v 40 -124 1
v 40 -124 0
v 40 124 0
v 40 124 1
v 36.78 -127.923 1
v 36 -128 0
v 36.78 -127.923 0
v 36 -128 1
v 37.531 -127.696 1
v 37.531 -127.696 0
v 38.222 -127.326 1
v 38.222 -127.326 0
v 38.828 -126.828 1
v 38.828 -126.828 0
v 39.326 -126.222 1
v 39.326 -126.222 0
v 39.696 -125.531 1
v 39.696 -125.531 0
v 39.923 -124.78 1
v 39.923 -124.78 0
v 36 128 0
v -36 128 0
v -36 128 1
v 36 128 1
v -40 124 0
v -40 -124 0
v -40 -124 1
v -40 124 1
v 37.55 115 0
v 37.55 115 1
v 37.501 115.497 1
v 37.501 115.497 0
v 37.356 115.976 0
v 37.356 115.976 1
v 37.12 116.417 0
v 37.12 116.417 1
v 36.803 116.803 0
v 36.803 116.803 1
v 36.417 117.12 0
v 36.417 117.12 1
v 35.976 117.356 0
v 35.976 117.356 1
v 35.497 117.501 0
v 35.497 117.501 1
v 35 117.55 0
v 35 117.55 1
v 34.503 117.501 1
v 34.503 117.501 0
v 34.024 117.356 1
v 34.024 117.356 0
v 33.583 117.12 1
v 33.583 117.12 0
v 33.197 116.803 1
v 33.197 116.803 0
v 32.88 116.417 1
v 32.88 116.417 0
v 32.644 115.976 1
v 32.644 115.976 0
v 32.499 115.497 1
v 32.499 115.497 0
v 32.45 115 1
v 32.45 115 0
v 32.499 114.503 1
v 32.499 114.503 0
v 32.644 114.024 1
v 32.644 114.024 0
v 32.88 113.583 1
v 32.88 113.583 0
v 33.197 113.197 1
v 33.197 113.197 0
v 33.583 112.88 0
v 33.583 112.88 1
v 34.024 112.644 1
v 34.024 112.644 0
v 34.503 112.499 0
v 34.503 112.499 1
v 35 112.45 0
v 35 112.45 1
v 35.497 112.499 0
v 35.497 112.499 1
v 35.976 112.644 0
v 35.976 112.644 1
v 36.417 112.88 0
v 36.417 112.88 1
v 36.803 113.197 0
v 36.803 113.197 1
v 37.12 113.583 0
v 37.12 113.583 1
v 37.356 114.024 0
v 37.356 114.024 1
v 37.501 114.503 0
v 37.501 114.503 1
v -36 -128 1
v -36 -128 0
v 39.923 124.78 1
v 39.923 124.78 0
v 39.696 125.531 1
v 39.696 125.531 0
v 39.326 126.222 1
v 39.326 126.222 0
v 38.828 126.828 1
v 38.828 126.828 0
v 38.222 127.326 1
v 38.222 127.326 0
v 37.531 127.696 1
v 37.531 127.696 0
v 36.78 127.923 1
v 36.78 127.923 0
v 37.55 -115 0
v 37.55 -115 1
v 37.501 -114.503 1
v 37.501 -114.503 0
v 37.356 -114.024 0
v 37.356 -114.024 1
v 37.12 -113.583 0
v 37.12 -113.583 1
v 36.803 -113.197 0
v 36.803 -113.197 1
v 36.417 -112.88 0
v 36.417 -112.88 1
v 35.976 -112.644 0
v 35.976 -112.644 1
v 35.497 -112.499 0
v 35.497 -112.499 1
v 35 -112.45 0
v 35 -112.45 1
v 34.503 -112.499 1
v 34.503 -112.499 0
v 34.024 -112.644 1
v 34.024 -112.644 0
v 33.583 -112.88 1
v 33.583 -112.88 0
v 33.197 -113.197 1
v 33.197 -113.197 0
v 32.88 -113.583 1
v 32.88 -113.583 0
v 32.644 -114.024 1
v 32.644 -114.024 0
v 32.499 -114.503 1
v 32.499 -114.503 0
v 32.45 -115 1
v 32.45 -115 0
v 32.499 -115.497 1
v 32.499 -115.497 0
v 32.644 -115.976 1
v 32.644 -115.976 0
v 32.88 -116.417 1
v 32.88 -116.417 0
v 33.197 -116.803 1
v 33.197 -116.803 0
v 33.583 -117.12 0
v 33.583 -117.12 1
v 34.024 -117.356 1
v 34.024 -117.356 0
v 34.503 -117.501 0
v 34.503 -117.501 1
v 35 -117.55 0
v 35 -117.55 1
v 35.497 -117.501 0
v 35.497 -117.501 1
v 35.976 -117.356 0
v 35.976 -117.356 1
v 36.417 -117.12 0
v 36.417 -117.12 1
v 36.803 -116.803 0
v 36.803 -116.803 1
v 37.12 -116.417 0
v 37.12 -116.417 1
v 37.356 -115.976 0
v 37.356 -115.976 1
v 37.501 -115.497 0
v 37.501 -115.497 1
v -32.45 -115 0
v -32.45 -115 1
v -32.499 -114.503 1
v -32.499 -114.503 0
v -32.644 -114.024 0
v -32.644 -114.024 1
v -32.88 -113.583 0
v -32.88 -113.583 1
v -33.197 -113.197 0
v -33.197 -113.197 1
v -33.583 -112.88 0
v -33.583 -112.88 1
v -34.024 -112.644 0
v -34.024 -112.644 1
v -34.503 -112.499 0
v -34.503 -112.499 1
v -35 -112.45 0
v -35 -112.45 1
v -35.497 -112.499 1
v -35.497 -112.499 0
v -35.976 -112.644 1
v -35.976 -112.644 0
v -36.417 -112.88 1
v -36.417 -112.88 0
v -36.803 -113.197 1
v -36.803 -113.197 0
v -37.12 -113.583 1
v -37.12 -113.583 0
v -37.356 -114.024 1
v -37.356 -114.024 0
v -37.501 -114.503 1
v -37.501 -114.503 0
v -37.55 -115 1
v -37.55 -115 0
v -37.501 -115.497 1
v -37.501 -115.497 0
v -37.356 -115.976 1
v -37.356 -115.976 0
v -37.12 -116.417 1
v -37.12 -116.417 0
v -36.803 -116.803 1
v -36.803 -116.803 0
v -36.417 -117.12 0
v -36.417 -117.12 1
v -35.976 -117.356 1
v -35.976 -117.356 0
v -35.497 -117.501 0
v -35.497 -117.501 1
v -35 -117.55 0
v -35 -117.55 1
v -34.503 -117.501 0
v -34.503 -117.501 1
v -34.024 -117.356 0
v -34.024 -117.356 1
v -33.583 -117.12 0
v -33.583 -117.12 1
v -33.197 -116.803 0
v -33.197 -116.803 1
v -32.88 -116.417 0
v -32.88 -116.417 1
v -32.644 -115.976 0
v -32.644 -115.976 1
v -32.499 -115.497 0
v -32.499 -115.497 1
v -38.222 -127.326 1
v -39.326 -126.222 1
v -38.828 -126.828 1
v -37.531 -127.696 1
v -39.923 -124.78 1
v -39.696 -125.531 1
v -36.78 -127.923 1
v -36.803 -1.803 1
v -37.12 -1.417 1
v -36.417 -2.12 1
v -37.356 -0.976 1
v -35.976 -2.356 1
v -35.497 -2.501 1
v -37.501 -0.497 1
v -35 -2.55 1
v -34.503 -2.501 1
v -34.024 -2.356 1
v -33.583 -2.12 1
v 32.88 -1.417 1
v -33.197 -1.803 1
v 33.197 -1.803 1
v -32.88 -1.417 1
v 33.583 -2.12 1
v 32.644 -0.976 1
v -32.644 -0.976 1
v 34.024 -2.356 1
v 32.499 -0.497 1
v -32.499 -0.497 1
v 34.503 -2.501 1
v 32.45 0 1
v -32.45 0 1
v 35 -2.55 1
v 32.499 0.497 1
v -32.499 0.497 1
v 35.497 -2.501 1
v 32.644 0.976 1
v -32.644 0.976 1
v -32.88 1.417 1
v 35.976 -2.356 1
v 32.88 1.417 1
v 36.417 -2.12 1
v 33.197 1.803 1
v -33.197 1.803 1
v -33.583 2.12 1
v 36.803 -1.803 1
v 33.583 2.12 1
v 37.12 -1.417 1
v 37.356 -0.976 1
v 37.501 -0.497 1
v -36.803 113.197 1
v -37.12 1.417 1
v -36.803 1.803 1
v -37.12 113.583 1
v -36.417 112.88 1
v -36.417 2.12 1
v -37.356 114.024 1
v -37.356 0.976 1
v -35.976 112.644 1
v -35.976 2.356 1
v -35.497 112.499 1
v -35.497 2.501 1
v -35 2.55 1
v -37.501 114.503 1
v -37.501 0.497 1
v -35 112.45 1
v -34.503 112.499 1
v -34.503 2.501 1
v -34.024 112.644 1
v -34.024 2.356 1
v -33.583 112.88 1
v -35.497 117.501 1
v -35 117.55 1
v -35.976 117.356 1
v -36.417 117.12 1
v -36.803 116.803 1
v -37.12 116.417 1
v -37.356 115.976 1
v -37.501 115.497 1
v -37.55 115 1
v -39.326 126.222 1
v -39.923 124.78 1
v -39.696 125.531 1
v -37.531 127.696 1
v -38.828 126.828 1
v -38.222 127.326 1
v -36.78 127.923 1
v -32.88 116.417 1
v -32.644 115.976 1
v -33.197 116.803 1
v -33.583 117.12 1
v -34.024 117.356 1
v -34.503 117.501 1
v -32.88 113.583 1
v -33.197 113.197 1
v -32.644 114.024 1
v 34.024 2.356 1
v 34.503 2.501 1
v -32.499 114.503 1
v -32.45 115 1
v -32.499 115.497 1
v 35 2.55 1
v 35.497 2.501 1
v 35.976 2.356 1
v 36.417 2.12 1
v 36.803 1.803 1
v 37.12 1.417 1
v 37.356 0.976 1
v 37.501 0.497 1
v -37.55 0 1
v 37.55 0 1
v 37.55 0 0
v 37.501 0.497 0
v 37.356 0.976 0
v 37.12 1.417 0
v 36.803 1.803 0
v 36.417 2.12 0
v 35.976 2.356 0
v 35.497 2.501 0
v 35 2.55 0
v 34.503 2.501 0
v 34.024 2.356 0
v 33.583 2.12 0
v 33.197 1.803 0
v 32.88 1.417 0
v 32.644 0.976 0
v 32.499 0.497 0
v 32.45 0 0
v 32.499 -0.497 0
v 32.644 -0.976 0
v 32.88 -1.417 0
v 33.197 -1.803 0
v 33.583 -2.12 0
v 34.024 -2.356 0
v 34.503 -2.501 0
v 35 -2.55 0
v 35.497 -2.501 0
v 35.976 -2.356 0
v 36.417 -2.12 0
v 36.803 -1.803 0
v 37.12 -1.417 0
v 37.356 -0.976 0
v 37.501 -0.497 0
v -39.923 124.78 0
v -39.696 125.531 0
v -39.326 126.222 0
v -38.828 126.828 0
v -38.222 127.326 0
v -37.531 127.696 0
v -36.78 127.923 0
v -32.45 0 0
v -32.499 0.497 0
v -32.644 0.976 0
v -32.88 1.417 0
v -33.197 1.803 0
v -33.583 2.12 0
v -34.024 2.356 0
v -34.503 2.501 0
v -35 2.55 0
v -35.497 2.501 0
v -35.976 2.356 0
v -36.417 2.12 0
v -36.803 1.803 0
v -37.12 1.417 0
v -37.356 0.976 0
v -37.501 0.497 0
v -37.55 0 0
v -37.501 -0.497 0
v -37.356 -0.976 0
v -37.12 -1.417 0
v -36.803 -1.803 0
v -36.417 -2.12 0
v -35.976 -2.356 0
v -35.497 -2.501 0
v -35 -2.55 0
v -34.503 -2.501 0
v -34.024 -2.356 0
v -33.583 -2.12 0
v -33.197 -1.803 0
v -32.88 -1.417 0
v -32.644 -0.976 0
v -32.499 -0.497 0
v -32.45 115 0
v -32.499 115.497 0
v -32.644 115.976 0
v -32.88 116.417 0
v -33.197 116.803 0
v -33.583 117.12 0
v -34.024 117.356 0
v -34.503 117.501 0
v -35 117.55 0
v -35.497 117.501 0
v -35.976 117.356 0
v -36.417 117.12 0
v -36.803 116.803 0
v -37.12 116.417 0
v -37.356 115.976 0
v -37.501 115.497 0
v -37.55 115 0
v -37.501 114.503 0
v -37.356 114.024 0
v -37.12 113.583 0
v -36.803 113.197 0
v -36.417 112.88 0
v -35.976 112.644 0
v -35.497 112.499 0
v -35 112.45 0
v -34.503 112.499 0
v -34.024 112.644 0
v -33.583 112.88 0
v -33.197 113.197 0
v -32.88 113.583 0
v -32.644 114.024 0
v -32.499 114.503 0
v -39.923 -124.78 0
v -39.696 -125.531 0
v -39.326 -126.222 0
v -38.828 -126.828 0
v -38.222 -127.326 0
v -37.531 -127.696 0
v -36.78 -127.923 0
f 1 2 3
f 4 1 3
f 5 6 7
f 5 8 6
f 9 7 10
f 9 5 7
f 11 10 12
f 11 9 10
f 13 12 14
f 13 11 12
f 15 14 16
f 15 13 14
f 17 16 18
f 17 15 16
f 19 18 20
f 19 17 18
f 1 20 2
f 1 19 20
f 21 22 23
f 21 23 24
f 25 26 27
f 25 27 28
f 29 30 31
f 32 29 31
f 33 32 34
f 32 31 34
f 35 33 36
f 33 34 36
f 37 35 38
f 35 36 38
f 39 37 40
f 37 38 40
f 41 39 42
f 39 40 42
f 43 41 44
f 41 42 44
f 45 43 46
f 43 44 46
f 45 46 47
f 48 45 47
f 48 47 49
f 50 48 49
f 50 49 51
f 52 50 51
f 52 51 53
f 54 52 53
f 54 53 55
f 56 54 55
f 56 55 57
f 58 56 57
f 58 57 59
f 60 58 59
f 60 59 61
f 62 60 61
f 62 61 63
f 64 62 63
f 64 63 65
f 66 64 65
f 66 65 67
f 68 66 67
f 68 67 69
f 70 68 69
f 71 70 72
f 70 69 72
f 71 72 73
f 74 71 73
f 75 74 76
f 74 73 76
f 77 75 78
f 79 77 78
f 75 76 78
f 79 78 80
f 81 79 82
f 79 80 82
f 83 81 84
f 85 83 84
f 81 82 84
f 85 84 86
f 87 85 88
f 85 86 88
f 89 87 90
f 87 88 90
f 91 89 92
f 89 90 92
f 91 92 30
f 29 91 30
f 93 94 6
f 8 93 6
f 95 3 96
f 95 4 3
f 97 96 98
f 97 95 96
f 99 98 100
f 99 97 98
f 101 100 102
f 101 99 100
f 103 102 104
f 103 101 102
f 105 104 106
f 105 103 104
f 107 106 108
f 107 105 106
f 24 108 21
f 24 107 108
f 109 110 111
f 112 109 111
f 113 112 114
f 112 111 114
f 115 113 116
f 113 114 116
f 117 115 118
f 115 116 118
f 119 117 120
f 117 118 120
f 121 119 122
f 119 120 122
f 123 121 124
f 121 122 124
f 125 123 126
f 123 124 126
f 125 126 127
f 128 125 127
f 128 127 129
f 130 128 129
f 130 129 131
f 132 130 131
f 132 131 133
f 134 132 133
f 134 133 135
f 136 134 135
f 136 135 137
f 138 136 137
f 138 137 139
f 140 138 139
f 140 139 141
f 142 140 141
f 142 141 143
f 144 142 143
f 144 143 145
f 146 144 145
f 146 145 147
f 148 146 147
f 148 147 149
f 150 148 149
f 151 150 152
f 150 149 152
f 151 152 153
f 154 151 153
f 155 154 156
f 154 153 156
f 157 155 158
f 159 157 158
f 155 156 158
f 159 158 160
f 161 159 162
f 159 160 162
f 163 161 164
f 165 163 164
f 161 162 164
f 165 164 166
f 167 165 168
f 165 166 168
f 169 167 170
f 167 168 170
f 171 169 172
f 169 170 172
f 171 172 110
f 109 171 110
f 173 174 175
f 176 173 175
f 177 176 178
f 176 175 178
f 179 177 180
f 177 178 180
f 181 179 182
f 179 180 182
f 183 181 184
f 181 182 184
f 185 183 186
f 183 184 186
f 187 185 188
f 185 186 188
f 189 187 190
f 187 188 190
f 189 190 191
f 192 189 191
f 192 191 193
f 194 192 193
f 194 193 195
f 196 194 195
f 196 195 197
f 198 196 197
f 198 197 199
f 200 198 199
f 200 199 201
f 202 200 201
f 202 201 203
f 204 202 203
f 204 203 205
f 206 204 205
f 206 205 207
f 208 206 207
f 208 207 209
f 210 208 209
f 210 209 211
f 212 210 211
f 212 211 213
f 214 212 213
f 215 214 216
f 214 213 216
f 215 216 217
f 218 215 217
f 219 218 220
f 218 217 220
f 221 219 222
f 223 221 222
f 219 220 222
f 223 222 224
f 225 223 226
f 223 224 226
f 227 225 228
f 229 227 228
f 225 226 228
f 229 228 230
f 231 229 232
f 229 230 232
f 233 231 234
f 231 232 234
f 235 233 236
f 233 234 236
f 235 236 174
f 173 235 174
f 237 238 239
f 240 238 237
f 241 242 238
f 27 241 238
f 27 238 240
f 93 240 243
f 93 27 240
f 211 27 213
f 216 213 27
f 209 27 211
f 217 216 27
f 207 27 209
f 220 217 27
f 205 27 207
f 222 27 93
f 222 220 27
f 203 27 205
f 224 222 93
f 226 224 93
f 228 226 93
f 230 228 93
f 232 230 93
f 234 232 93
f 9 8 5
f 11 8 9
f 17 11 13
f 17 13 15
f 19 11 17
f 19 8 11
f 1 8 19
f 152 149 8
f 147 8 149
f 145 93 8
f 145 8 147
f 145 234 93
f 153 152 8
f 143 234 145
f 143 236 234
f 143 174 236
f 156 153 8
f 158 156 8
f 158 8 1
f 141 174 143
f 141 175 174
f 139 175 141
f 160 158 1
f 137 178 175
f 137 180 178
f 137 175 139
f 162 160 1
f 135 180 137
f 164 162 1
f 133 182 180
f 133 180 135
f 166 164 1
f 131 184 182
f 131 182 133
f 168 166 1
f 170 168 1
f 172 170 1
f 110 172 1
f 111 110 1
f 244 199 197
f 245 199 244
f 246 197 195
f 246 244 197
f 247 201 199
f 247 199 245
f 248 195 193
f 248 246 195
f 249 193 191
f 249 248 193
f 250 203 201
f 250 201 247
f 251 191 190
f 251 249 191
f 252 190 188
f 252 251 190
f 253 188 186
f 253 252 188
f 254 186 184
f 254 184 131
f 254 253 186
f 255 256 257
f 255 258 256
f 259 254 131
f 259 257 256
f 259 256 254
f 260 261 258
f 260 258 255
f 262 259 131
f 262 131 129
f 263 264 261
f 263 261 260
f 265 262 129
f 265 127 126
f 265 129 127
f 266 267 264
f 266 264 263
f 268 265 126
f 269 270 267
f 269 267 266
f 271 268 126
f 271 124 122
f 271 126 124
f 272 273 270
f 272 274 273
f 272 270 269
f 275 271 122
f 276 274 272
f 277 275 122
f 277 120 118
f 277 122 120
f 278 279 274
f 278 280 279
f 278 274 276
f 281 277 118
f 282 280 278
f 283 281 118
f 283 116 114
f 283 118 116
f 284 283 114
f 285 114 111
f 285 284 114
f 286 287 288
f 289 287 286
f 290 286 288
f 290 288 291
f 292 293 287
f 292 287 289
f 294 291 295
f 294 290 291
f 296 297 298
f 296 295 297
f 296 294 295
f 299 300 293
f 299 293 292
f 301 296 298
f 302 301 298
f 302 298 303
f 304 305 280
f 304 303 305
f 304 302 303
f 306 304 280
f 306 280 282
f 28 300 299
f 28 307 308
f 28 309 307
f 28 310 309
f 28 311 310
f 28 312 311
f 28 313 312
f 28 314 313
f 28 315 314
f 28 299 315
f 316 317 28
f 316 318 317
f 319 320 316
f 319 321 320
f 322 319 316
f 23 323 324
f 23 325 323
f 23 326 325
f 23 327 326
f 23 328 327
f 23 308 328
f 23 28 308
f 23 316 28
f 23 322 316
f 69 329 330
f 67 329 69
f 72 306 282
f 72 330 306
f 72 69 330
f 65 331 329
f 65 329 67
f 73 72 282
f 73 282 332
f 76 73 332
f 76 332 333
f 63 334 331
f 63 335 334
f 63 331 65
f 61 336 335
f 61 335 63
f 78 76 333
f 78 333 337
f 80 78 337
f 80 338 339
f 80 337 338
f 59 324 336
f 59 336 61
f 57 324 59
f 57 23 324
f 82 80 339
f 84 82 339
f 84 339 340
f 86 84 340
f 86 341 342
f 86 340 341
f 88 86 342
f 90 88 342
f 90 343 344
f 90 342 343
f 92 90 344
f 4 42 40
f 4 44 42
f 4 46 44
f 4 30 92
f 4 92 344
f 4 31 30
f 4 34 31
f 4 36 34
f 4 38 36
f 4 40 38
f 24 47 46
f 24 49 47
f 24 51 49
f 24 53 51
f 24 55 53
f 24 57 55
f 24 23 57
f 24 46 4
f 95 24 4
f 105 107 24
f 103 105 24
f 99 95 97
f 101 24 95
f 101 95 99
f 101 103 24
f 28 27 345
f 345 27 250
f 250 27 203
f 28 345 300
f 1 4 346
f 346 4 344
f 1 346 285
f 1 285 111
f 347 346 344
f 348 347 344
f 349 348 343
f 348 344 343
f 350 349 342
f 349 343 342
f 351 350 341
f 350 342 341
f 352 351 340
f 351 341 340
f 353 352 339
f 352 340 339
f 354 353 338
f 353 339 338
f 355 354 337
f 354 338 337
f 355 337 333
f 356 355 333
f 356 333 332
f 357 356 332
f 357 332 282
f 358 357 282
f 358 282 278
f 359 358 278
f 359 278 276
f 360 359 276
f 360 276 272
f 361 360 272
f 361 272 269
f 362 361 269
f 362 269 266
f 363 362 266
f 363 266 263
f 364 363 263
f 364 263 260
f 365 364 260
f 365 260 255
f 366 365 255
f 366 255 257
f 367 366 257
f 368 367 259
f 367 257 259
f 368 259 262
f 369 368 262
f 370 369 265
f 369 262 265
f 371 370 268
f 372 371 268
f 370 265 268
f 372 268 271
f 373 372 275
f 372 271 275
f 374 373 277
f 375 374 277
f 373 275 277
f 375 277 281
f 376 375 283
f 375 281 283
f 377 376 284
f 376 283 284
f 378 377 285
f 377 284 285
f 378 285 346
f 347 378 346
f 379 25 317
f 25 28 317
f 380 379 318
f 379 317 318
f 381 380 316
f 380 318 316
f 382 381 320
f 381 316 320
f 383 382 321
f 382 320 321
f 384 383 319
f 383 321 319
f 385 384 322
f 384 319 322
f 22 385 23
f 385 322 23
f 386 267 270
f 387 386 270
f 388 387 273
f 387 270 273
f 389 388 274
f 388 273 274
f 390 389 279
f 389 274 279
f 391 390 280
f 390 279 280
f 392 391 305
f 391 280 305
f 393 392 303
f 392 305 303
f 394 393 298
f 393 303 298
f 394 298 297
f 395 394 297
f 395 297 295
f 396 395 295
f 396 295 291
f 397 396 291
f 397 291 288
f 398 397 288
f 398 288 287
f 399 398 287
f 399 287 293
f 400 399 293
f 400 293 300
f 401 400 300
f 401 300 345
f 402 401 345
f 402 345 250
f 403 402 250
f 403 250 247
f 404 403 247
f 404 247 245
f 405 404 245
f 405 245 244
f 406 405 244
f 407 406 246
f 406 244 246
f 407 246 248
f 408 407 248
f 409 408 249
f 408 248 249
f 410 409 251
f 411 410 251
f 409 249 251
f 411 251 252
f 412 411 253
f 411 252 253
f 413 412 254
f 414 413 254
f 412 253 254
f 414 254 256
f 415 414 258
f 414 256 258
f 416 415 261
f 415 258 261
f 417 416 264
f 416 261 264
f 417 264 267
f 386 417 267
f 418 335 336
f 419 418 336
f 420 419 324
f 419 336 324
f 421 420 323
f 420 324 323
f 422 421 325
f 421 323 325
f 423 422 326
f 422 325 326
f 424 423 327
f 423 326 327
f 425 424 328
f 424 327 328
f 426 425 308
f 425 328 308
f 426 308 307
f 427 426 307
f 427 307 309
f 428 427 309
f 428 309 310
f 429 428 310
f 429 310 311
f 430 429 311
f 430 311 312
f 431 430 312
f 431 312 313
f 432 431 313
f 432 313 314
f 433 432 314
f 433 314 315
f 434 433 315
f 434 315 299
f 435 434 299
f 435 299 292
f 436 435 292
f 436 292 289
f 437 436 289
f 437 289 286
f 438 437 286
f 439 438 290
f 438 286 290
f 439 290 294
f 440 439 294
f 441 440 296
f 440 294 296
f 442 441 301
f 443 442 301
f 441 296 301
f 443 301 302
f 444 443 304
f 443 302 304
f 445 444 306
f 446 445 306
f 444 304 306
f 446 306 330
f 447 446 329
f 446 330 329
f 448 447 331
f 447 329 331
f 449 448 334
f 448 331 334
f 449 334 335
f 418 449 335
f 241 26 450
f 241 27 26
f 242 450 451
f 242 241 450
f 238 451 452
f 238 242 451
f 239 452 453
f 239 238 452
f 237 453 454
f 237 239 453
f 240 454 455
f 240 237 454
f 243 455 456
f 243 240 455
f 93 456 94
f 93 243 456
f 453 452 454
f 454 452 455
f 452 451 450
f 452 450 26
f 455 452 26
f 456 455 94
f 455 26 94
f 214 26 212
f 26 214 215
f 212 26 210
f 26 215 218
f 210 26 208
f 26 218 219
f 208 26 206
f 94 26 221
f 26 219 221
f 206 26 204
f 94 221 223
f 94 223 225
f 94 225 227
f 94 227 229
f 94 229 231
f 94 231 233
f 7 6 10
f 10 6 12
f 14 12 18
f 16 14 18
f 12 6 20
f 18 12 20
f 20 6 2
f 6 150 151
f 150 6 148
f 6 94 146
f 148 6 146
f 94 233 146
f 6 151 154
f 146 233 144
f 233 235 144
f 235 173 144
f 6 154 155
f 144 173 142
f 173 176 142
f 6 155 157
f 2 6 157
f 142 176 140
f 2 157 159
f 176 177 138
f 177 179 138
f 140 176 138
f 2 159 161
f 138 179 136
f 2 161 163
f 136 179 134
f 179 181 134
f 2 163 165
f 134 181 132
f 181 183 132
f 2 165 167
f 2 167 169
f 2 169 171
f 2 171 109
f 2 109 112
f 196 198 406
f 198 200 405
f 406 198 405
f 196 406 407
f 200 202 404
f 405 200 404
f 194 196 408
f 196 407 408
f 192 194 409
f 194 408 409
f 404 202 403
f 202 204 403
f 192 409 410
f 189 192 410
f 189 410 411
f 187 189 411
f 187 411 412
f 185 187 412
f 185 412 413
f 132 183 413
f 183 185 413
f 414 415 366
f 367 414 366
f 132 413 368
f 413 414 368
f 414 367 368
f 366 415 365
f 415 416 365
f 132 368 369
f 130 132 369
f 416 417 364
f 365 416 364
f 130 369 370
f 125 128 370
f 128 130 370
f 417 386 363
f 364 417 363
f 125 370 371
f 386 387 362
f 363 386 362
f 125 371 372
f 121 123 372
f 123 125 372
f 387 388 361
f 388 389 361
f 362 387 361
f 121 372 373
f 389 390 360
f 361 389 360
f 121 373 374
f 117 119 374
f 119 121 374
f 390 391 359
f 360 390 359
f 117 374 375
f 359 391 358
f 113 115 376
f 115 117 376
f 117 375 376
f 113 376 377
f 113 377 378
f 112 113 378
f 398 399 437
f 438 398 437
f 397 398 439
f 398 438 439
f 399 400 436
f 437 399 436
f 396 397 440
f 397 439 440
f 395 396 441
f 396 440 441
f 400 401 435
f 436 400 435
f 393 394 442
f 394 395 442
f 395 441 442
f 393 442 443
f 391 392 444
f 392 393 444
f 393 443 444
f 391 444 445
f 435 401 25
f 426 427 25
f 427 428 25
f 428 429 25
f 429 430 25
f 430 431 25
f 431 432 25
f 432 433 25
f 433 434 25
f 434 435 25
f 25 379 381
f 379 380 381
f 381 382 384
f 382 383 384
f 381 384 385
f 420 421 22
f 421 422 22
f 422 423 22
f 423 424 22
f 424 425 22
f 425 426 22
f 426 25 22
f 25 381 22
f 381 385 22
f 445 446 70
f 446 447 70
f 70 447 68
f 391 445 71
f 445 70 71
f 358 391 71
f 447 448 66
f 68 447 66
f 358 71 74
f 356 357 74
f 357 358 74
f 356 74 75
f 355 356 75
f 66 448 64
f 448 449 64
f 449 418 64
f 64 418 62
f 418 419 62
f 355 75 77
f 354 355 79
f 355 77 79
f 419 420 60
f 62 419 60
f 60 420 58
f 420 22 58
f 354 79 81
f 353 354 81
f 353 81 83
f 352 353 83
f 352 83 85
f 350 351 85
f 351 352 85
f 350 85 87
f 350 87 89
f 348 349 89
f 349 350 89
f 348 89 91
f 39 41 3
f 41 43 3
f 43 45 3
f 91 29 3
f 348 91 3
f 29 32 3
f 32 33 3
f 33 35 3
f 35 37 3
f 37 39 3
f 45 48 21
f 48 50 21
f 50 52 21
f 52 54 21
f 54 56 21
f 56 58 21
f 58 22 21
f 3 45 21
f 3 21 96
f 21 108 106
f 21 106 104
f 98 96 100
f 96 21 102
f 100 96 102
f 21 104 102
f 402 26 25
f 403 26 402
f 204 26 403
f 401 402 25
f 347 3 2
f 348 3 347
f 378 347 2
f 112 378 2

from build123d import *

# Parameters (mm, degrees)
SKETCH1_W           = 80
SKETCH1_H           = 256
BOSS_EXTRUDE1_DEPTH = 1
FILLET1_R           = 4
SKETCH2_R           = 2.55
CUT_EXTRUDE1_DEPTH  = 135.1081653


with BuildPart() as part:
    # Sketch1 → Boss-Extrude1 (new body)
    with BuildSketch(Plane.XY):
        Rectangle(SKETCH1_W, SKETCH1_H)
    extrude(amount=BOSS_EXTRUDE1_DEPTH)

    # Fillet1
    fillet1_edges = [part.edges().sort_by_distance(p)[0] for p in [
        (40, -128, 0.5),
        (-40, -128, 0.5),
        (-40, 128, 0.5),
        (40, 128, 0.5),
    ]]
    fillet(fillet1_edges, radius=FILLET1_R)

    # Sketch2 → Cut-Extrude1 (cut, through all)
    with BuildSketch(Plane.XY.offset(1)):
        with Locations((35, -115)):
            Circle(SKETCH2_R)
        with Locations((-35, -115)):
            Circle(SKETCH2_R)
        with Locations((-35, 0)):
            Circle(SKETCH2_R)
        with Locations((35, 0)):
            Circle(SKETCH2_R)
        with Locations((35, 115)):
            Circle(SKETCH2_R)
        with Locations((-35, 115)):
            Circle(SKETCH2_R)
    extrude(amount=-CUT_EXTRUDE1_DEPTH, mode=Mode.SUBTRACT)


solid = part.part
